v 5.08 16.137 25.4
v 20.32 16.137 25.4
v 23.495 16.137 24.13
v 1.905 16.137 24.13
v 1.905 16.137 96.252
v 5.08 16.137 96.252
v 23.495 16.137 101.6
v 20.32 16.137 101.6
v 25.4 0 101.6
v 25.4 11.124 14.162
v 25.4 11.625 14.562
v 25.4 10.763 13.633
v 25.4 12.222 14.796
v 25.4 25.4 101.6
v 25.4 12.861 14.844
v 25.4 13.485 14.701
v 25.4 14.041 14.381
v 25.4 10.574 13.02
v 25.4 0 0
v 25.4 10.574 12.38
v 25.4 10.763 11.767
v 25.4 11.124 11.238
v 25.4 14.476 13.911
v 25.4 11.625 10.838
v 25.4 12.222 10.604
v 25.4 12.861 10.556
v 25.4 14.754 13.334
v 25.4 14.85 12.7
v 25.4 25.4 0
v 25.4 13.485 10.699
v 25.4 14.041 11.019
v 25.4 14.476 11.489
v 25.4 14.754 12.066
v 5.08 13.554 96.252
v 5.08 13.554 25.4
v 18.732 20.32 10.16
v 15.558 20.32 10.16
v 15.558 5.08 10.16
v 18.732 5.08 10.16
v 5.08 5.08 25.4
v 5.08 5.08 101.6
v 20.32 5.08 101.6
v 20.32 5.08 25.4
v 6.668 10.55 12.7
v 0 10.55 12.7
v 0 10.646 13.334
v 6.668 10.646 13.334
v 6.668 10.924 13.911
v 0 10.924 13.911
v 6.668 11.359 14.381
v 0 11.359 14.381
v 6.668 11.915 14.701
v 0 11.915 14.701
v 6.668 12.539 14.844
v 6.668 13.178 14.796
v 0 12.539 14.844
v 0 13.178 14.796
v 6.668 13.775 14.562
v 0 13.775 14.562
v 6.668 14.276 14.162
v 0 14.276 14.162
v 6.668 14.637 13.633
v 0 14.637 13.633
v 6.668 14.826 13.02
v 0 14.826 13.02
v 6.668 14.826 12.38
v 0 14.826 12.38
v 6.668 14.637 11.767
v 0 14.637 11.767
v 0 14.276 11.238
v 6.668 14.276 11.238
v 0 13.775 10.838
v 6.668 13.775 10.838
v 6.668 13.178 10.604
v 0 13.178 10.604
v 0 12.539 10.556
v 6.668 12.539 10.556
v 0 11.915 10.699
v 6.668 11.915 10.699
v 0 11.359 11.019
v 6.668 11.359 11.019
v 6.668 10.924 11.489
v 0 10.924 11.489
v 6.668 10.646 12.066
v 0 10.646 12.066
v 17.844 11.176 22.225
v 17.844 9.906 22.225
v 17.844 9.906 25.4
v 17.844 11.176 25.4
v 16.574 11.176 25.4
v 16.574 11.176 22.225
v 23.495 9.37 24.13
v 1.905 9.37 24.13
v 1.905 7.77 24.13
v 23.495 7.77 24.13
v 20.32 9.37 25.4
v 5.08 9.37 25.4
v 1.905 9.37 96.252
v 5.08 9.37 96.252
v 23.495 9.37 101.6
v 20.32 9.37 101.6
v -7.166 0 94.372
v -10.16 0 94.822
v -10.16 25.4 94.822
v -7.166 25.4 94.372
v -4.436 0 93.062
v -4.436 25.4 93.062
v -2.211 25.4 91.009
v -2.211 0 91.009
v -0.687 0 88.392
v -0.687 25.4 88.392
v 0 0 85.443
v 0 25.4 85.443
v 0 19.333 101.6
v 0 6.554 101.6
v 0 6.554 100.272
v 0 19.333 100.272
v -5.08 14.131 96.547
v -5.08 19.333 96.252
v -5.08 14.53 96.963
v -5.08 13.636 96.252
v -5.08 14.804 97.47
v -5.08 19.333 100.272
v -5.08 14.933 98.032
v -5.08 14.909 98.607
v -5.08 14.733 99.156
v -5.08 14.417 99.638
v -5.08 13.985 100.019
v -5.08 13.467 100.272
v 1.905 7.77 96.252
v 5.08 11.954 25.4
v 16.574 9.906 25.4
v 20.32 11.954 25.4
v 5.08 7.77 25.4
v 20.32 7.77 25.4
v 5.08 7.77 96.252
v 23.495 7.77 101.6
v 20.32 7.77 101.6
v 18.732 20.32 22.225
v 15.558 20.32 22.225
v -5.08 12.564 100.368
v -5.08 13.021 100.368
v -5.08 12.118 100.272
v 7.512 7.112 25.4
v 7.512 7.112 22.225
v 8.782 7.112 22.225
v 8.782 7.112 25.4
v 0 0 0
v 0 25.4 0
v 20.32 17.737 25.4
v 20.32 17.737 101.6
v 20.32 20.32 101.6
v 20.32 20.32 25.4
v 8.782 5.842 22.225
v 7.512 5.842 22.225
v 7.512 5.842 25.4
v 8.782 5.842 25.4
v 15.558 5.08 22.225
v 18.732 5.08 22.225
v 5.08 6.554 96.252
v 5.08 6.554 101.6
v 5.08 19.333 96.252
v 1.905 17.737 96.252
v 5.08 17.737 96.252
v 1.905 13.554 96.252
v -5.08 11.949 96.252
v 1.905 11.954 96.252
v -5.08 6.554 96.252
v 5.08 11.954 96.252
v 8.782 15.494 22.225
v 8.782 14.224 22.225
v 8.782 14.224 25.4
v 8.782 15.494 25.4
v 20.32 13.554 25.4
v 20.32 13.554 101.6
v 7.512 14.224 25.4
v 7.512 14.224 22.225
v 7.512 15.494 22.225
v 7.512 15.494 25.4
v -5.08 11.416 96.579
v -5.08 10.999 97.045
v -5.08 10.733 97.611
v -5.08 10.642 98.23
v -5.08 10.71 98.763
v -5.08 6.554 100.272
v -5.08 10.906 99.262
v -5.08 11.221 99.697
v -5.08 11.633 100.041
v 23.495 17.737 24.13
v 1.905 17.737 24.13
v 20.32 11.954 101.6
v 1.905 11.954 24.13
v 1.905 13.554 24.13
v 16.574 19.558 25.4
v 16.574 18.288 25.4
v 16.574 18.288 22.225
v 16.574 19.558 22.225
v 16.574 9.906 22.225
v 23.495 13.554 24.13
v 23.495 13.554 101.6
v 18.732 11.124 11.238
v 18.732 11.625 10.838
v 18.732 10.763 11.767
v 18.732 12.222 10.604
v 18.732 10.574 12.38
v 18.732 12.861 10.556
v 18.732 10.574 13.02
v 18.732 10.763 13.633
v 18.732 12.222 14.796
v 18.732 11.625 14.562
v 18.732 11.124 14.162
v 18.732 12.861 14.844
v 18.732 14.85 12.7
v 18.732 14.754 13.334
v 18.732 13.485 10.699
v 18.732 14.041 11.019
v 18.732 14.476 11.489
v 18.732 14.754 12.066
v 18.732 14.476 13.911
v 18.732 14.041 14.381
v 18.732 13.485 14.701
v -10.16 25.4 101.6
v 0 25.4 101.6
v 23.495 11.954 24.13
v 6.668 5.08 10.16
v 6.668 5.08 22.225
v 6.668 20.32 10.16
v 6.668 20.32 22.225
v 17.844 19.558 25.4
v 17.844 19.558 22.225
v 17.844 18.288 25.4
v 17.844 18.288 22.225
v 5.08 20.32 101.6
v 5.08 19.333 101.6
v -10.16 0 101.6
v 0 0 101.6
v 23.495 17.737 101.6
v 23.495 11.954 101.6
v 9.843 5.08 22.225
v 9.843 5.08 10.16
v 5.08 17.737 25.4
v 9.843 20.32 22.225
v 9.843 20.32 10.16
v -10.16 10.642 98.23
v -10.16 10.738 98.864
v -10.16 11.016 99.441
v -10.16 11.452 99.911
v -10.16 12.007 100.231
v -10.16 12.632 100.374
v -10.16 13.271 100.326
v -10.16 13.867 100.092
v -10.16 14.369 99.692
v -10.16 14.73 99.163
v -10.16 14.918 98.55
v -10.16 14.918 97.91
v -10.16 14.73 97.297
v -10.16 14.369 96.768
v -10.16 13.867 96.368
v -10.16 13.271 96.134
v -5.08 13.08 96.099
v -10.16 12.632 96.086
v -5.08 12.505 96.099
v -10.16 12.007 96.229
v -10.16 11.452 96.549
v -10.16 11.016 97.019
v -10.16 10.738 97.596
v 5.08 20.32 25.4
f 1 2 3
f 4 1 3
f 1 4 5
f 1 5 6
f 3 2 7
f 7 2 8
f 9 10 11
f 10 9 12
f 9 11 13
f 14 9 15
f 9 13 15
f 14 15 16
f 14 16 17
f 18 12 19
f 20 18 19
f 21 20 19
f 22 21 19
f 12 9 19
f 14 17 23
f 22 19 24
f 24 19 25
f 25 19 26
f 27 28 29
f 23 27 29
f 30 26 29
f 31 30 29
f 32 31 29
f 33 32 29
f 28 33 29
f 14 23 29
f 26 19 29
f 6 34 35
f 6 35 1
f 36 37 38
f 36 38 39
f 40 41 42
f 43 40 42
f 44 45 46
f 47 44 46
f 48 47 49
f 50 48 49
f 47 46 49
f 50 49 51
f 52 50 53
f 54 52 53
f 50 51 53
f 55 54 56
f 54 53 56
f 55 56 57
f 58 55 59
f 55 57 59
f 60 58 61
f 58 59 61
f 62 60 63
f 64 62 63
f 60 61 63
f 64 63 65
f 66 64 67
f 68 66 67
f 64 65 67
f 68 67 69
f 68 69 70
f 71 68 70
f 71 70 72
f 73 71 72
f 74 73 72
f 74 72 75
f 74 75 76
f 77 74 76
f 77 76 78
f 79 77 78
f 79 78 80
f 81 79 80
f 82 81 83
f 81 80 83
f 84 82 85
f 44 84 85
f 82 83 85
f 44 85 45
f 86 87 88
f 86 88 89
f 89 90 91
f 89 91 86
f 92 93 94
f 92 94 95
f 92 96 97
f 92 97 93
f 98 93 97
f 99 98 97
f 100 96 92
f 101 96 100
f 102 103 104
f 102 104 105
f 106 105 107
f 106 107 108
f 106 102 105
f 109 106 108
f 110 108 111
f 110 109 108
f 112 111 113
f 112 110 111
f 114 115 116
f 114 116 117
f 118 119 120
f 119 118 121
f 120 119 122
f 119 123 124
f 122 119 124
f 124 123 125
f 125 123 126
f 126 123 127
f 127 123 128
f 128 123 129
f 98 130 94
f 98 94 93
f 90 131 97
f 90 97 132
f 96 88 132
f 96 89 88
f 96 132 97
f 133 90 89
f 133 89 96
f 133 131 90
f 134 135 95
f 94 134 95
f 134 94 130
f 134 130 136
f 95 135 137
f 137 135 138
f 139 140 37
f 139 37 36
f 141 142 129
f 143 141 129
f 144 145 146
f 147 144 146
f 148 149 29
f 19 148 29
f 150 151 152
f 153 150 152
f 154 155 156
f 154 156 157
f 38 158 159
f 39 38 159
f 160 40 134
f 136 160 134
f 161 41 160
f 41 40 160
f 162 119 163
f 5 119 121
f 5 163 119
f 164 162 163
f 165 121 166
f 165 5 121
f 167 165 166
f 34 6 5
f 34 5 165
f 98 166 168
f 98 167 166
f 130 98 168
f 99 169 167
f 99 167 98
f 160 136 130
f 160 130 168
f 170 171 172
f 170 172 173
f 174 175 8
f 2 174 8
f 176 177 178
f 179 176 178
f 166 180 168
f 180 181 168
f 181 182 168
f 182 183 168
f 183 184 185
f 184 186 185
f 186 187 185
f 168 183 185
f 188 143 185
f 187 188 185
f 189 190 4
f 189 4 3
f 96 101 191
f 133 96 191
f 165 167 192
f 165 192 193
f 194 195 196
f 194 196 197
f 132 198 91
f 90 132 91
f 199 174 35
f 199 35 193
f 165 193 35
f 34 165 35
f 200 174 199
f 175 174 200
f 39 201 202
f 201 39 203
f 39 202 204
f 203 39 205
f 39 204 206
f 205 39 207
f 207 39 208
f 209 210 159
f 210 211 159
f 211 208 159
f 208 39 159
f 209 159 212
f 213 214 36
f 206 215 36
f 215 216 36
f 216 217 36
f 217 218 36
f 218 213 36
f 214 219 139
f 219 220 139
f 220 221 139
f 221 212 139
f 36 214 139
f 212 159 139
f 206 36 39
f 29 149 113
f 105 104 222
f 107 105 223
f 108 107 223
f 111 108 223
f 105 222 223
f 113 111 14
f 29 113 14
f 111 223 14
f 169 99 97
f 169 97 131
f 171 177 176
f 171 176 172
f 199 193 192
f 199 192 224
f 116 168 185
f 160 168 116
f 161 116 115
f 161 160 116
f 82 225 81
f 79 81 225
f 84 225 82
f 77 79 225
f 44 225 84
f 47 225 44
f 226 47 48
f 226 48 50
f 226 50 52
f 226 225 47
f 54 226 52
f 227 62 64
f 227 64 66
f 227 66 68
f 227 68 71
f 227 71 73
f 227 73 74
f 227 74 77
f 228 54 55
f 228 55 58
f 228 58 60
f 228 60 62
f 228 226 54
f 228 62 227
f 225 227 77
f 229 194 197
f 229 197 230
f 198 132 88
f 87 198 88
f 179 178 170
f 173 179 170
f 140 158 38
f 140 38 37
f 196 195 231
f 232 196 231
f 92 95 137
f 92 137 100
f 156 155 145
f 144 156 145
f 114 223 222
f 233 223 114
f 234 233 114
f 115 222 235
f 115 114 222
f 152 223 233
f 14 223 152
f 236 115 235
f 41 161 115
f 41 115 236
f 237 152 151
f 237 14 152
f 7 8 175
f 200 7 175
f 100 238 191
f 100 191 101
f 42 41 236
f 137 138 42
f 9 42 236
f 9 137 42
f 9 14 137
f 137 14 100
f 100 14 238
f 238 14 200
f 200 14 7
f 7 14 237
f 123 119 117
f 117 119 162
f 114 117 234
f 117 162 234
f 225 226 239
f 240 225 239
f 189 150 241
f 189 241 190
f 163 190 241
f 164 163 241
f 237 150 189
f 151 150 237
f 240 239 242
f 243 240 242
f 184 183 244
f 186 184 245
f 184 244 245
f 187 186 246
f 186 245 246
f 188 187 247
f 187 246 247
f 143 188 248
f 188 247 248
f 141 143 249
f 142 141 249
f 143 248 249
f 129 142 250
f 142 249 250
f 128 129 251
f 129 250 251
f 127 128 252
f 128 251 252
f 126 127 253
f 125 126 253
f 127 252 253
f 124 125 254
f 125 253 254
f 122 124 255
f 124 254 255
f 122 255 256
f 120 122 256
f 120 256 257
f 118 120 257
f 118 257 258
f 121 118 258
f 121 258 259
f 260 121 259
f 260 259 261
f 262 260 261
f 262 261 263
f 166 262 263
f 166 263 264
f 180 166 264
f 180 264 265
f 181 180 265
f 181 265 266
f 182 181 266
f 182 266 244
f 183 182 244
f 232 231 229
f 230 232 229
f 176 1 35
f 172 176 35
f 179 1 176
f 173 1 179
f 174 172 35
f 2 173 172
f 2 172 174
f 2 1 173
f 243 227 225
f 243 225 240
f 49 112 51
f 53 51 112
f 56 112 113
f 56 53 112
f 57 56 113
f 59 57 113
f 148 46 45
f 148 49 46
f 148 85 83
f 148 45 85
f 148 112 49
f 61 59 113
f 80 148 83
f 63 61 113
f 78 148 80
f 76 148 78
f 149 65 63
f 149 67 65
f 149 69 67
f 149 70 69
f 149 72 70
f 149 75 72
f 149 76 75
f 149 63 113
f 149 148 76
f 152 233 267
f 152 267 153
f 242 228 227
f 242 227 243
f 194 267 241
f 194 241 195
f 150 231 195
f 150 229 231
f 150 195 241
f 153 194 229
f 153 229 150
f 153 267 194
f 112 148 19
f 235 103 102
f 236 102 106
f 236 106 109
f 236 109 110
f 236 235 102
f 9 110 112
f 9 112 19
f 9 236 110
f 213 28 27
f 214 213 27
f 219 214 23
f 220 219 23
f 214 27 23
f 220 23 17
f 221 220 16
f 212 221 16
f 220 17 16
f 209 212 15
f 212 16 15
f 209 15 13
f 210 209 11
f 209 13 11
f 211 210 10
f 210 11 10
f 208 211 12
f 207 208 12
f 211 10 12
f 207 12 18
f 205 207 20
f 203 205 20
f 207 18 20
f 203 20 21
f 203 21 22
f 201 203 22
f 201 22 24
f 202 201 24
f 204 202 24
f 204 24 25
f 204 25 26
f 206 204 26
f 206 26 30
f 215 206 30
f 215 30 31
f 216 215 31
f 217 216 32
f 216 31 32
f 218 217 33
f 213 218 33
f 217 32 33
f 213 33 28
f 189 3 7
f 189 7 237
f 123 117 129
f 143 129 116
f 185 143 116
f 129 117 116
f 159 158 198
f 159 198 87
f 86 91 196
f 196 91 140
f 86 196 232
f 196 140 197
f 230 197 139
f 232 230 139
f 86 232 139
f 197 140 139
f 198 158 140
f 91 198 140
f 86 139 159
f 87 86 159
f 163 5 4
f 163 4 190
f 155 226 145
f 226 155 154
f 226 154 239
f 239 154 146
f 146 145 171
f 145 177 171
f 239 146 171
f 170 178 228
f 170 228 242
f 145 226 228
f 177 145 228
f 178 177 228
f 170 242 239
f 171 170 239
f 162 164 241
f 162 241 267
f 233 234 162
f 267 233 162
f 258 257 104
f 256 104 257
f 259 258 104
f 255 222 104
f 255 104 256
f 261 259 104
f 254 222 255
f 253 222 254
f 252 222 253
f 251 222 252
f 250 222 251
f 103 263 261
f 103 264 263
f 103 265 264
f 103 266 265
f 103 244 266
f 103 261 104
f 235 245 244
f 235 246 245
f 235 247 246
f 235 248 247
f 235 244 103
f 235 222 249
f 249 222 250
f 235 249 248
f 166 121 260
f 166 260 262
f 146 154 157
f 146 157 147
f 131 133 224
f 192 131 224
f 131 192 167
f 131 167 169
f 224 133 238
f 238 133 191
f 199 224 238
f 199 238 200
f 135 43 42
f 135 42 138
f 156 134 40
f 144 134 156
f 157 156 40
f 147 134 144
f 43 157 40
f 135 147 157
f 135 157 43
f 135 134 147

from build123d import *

# Parameters (mm, degrees)
F0_W      = 25.4
F0_H      = 25.4
F1_DEPTH  = 101.6
F2_W      = 15.24
F2_H      = 15.24
F3_DEPTH  = 76.2
F6_START  = -3.175
F5_W      = 3.175
F5_H      = 15.24
F6_DEPTH  = 12.065
F4_R      = 2.15
F7_DEPTH  = 6.6675
F8_R      = 2.15
F9_DEPTH  = 6.6675
F10_W     = 1.27
F10_H     = 1.27
F12_DEPTH = 3.175
F11_W     = 1.27
F11_H     = 1.27
F13_DEPTH = 3.175
F14_W     = 12.7794421278
F14_H     = 4.0193349123
F15_DEPTH = 5.08
F16_W     = 25.4
F16_H     = 6.7783382893
F16_W_2   = 12.7794421278
F16_H_2   = 4.0193349123
F17_DEPTH = 5.08
F18_W     = 25.4
F18_H     = 6.7783382893
F19_DEPTH = 5.08
F20_R     = 2.15
F21_DEPTH = 5.08
F23_DEPTH = 25.4
F24_W     = 21.59
F24_H     = 1.6
F25_DEPTH = 77.47
F26_W     = 12.7794421278
F26_H     = 1.3284322977
F27_DEPTH = 5.08


with BuildPart() as f1:
    # F0 (on Top) → F1 (new body)
    with BuildSketch(Plane.XY):
        with Locations((12.7, 12.7)):
            Rectangle(F0_W, F0_H)
    extrude(amount=F1_DEPTH)

    # F2 (on face) → F3 (cut)
    with BuildSketch(Plane.XY.offset(101.6)):
        with Locations((12.7, 12.7)):
            Rectangle(F2_W, F2_H)
    extrude(amount=-F3_DEPTH, mode=Mode.SUBTRACT)

    # F5 (on face) → F6 (cut)
    with BuildSketch(Plane.XY.offset(25.4).offset(F6_START)):
        with Locations((17.145, 12.7)):
            Rectangle(F5_W, F5_H)
        with Locations((8.255, 12.7)):
            Rectangle(F5_W, F5_H)
    extrude(amount=-F6_DEPTH, mode=Mode.SUBTRACT)

    # F4 (on face) → F7 (cut, through all)
    with BuildSketch(Plane.YZ.offset(25.4)):
        with Locations((12.7, 12.7)):
            Circle(F4_R)
    extrude(amount=-F7_DEPTH, mode=Mode.SUBTRACT)

    # F8 (on face) → F9 (cut, through all)
    with BuildSketch(Plane(origin=(0, 0, 0), x_dir=(0, -1, 0), z_dir=(-1, 0, 0))):
        with Locations((-12.7, 12.7)):
            Circle(F8_R)
    extrude(amount=-F9_DEPTH, mode=Mode.SUBTRACT)

    # F10 (on face) → F12 (cut, through all)
    with BuildSketch(Plane.XY.offset(25.4)):
        with Locations((17.2085, 18.923)):
            Rectangle(F10_W, F10_H)
        with Locations((17.2085, 10.541)):
            Rectangle(F10_W, F10_H)
    extrude(amount=-F12_DEPTH, mode=Mode.SUBTRACT)

    # F11 (on face) → F13 (cut, through all)
    with BuildSketch(Plane.XY.offset(25.4)):
        with Locations((8.1467080774, 6.477)):
            Rectangle(F11_W, F11_H)
        with Locations((8.1467080774, 14.859)):
            Rectangle(F11_W, F11_H)
    extrude(amount=-F13_DEPTH, mode=Mode.SUBTRACT)

    # F14 (on face) → F15 (cut, through all)
    with BuildSketch(Plane(origin=(0, 0, 0), x_dir=(0, -1, 0), z_dir=(-1, 0, 0))):
        with Locations((-12.943365844, 98.2619002461)):
            Rectangle(F14_W, F14_H)
    extrude(amount=-F15_DEPTH, mode=Mode.SUBTRACT)

    # F16 (on face) → F17 (join)
    with BuildSketch(Plane(origin=(0, 0, 0), x_dir=(0, -1, 0), z_dir=(-1, 0, 0))):
        with Locations((-12.7, 98.2108308554)):
            Rectangle(F16_W, F16_H)
        with Locations((-12.943365844, 98.2619002461)):
            Rectangle(F16_W_2, F16_H_2, mode=Mode.SUBTRACT)
    extrude(amount=F17_DEPTH)

    # F18 (on face) → F19 (join)
    with BuildSketch(Plane(origin=(-5.08, 0, 0), x_dir=(0, -1, 0), z_dir=(-1, 0, 0))):
        with Locations((-12.7, 98.2108308554)):
            Rectangle(F18_W, F18_H)
    extrude(amount=F19_DEPTH)

    # F20 (on face) → F21 (cut)
    with BuildSketch(Plane(origin=(-10.16, 0, 0), x_dir=(0, -1, 0), z_dir=(-1, 0, 0))):
        with Locations((-12.7924755216, 98.2300043106)):
            Circle(F20_R)
    extrude(amount=-F21_DEPTH, mode=Mode.SUBTRACT)

    # F22 (on face) → F23 (join, through all)
    with BuildSketch(Plane.XZ):
        with BuildLine():
            ThreePointArc((-10.16, 94.8216617107), (-3.2465860676, 92.1186283067), (0, 85.4431986809))
            Line((0, 85.4431986809), (0, 94.8216617107))
            Line((0, 94.8216617107), (-10.16, 94.8216617107))
        make_face()
    extrude(amount=-F23_DEPTH)

    # F24 (on face) → F25 (cut)
    with BuildSketch(Plane.XY.offset(101.6)):
        with Locations((12.7, 16.93682)):
            Rectangle(F24_W, F24_H)
        with Locations((12.7, 8.57046)):
            Rectangle(F24_W, F24_H)
        with Locations((12.7, 12.75364)):
            Rectangle(F24_W, F24_H)
    extrude(amount=-F25_DEPTH, mode=Mode.SUBTRACT)

    # F26 (on face) → F27 (cut)
    with BuildSketch(Plane.YZ.offset(5.08)):
        with Locations((12.943365844, 100.9357838511)):
            Rectangle(F26_W, F26_H)
    extrude(amount=-F27_DEPTH, mode=Mode.SUBTRACT)


solid = f1.part
